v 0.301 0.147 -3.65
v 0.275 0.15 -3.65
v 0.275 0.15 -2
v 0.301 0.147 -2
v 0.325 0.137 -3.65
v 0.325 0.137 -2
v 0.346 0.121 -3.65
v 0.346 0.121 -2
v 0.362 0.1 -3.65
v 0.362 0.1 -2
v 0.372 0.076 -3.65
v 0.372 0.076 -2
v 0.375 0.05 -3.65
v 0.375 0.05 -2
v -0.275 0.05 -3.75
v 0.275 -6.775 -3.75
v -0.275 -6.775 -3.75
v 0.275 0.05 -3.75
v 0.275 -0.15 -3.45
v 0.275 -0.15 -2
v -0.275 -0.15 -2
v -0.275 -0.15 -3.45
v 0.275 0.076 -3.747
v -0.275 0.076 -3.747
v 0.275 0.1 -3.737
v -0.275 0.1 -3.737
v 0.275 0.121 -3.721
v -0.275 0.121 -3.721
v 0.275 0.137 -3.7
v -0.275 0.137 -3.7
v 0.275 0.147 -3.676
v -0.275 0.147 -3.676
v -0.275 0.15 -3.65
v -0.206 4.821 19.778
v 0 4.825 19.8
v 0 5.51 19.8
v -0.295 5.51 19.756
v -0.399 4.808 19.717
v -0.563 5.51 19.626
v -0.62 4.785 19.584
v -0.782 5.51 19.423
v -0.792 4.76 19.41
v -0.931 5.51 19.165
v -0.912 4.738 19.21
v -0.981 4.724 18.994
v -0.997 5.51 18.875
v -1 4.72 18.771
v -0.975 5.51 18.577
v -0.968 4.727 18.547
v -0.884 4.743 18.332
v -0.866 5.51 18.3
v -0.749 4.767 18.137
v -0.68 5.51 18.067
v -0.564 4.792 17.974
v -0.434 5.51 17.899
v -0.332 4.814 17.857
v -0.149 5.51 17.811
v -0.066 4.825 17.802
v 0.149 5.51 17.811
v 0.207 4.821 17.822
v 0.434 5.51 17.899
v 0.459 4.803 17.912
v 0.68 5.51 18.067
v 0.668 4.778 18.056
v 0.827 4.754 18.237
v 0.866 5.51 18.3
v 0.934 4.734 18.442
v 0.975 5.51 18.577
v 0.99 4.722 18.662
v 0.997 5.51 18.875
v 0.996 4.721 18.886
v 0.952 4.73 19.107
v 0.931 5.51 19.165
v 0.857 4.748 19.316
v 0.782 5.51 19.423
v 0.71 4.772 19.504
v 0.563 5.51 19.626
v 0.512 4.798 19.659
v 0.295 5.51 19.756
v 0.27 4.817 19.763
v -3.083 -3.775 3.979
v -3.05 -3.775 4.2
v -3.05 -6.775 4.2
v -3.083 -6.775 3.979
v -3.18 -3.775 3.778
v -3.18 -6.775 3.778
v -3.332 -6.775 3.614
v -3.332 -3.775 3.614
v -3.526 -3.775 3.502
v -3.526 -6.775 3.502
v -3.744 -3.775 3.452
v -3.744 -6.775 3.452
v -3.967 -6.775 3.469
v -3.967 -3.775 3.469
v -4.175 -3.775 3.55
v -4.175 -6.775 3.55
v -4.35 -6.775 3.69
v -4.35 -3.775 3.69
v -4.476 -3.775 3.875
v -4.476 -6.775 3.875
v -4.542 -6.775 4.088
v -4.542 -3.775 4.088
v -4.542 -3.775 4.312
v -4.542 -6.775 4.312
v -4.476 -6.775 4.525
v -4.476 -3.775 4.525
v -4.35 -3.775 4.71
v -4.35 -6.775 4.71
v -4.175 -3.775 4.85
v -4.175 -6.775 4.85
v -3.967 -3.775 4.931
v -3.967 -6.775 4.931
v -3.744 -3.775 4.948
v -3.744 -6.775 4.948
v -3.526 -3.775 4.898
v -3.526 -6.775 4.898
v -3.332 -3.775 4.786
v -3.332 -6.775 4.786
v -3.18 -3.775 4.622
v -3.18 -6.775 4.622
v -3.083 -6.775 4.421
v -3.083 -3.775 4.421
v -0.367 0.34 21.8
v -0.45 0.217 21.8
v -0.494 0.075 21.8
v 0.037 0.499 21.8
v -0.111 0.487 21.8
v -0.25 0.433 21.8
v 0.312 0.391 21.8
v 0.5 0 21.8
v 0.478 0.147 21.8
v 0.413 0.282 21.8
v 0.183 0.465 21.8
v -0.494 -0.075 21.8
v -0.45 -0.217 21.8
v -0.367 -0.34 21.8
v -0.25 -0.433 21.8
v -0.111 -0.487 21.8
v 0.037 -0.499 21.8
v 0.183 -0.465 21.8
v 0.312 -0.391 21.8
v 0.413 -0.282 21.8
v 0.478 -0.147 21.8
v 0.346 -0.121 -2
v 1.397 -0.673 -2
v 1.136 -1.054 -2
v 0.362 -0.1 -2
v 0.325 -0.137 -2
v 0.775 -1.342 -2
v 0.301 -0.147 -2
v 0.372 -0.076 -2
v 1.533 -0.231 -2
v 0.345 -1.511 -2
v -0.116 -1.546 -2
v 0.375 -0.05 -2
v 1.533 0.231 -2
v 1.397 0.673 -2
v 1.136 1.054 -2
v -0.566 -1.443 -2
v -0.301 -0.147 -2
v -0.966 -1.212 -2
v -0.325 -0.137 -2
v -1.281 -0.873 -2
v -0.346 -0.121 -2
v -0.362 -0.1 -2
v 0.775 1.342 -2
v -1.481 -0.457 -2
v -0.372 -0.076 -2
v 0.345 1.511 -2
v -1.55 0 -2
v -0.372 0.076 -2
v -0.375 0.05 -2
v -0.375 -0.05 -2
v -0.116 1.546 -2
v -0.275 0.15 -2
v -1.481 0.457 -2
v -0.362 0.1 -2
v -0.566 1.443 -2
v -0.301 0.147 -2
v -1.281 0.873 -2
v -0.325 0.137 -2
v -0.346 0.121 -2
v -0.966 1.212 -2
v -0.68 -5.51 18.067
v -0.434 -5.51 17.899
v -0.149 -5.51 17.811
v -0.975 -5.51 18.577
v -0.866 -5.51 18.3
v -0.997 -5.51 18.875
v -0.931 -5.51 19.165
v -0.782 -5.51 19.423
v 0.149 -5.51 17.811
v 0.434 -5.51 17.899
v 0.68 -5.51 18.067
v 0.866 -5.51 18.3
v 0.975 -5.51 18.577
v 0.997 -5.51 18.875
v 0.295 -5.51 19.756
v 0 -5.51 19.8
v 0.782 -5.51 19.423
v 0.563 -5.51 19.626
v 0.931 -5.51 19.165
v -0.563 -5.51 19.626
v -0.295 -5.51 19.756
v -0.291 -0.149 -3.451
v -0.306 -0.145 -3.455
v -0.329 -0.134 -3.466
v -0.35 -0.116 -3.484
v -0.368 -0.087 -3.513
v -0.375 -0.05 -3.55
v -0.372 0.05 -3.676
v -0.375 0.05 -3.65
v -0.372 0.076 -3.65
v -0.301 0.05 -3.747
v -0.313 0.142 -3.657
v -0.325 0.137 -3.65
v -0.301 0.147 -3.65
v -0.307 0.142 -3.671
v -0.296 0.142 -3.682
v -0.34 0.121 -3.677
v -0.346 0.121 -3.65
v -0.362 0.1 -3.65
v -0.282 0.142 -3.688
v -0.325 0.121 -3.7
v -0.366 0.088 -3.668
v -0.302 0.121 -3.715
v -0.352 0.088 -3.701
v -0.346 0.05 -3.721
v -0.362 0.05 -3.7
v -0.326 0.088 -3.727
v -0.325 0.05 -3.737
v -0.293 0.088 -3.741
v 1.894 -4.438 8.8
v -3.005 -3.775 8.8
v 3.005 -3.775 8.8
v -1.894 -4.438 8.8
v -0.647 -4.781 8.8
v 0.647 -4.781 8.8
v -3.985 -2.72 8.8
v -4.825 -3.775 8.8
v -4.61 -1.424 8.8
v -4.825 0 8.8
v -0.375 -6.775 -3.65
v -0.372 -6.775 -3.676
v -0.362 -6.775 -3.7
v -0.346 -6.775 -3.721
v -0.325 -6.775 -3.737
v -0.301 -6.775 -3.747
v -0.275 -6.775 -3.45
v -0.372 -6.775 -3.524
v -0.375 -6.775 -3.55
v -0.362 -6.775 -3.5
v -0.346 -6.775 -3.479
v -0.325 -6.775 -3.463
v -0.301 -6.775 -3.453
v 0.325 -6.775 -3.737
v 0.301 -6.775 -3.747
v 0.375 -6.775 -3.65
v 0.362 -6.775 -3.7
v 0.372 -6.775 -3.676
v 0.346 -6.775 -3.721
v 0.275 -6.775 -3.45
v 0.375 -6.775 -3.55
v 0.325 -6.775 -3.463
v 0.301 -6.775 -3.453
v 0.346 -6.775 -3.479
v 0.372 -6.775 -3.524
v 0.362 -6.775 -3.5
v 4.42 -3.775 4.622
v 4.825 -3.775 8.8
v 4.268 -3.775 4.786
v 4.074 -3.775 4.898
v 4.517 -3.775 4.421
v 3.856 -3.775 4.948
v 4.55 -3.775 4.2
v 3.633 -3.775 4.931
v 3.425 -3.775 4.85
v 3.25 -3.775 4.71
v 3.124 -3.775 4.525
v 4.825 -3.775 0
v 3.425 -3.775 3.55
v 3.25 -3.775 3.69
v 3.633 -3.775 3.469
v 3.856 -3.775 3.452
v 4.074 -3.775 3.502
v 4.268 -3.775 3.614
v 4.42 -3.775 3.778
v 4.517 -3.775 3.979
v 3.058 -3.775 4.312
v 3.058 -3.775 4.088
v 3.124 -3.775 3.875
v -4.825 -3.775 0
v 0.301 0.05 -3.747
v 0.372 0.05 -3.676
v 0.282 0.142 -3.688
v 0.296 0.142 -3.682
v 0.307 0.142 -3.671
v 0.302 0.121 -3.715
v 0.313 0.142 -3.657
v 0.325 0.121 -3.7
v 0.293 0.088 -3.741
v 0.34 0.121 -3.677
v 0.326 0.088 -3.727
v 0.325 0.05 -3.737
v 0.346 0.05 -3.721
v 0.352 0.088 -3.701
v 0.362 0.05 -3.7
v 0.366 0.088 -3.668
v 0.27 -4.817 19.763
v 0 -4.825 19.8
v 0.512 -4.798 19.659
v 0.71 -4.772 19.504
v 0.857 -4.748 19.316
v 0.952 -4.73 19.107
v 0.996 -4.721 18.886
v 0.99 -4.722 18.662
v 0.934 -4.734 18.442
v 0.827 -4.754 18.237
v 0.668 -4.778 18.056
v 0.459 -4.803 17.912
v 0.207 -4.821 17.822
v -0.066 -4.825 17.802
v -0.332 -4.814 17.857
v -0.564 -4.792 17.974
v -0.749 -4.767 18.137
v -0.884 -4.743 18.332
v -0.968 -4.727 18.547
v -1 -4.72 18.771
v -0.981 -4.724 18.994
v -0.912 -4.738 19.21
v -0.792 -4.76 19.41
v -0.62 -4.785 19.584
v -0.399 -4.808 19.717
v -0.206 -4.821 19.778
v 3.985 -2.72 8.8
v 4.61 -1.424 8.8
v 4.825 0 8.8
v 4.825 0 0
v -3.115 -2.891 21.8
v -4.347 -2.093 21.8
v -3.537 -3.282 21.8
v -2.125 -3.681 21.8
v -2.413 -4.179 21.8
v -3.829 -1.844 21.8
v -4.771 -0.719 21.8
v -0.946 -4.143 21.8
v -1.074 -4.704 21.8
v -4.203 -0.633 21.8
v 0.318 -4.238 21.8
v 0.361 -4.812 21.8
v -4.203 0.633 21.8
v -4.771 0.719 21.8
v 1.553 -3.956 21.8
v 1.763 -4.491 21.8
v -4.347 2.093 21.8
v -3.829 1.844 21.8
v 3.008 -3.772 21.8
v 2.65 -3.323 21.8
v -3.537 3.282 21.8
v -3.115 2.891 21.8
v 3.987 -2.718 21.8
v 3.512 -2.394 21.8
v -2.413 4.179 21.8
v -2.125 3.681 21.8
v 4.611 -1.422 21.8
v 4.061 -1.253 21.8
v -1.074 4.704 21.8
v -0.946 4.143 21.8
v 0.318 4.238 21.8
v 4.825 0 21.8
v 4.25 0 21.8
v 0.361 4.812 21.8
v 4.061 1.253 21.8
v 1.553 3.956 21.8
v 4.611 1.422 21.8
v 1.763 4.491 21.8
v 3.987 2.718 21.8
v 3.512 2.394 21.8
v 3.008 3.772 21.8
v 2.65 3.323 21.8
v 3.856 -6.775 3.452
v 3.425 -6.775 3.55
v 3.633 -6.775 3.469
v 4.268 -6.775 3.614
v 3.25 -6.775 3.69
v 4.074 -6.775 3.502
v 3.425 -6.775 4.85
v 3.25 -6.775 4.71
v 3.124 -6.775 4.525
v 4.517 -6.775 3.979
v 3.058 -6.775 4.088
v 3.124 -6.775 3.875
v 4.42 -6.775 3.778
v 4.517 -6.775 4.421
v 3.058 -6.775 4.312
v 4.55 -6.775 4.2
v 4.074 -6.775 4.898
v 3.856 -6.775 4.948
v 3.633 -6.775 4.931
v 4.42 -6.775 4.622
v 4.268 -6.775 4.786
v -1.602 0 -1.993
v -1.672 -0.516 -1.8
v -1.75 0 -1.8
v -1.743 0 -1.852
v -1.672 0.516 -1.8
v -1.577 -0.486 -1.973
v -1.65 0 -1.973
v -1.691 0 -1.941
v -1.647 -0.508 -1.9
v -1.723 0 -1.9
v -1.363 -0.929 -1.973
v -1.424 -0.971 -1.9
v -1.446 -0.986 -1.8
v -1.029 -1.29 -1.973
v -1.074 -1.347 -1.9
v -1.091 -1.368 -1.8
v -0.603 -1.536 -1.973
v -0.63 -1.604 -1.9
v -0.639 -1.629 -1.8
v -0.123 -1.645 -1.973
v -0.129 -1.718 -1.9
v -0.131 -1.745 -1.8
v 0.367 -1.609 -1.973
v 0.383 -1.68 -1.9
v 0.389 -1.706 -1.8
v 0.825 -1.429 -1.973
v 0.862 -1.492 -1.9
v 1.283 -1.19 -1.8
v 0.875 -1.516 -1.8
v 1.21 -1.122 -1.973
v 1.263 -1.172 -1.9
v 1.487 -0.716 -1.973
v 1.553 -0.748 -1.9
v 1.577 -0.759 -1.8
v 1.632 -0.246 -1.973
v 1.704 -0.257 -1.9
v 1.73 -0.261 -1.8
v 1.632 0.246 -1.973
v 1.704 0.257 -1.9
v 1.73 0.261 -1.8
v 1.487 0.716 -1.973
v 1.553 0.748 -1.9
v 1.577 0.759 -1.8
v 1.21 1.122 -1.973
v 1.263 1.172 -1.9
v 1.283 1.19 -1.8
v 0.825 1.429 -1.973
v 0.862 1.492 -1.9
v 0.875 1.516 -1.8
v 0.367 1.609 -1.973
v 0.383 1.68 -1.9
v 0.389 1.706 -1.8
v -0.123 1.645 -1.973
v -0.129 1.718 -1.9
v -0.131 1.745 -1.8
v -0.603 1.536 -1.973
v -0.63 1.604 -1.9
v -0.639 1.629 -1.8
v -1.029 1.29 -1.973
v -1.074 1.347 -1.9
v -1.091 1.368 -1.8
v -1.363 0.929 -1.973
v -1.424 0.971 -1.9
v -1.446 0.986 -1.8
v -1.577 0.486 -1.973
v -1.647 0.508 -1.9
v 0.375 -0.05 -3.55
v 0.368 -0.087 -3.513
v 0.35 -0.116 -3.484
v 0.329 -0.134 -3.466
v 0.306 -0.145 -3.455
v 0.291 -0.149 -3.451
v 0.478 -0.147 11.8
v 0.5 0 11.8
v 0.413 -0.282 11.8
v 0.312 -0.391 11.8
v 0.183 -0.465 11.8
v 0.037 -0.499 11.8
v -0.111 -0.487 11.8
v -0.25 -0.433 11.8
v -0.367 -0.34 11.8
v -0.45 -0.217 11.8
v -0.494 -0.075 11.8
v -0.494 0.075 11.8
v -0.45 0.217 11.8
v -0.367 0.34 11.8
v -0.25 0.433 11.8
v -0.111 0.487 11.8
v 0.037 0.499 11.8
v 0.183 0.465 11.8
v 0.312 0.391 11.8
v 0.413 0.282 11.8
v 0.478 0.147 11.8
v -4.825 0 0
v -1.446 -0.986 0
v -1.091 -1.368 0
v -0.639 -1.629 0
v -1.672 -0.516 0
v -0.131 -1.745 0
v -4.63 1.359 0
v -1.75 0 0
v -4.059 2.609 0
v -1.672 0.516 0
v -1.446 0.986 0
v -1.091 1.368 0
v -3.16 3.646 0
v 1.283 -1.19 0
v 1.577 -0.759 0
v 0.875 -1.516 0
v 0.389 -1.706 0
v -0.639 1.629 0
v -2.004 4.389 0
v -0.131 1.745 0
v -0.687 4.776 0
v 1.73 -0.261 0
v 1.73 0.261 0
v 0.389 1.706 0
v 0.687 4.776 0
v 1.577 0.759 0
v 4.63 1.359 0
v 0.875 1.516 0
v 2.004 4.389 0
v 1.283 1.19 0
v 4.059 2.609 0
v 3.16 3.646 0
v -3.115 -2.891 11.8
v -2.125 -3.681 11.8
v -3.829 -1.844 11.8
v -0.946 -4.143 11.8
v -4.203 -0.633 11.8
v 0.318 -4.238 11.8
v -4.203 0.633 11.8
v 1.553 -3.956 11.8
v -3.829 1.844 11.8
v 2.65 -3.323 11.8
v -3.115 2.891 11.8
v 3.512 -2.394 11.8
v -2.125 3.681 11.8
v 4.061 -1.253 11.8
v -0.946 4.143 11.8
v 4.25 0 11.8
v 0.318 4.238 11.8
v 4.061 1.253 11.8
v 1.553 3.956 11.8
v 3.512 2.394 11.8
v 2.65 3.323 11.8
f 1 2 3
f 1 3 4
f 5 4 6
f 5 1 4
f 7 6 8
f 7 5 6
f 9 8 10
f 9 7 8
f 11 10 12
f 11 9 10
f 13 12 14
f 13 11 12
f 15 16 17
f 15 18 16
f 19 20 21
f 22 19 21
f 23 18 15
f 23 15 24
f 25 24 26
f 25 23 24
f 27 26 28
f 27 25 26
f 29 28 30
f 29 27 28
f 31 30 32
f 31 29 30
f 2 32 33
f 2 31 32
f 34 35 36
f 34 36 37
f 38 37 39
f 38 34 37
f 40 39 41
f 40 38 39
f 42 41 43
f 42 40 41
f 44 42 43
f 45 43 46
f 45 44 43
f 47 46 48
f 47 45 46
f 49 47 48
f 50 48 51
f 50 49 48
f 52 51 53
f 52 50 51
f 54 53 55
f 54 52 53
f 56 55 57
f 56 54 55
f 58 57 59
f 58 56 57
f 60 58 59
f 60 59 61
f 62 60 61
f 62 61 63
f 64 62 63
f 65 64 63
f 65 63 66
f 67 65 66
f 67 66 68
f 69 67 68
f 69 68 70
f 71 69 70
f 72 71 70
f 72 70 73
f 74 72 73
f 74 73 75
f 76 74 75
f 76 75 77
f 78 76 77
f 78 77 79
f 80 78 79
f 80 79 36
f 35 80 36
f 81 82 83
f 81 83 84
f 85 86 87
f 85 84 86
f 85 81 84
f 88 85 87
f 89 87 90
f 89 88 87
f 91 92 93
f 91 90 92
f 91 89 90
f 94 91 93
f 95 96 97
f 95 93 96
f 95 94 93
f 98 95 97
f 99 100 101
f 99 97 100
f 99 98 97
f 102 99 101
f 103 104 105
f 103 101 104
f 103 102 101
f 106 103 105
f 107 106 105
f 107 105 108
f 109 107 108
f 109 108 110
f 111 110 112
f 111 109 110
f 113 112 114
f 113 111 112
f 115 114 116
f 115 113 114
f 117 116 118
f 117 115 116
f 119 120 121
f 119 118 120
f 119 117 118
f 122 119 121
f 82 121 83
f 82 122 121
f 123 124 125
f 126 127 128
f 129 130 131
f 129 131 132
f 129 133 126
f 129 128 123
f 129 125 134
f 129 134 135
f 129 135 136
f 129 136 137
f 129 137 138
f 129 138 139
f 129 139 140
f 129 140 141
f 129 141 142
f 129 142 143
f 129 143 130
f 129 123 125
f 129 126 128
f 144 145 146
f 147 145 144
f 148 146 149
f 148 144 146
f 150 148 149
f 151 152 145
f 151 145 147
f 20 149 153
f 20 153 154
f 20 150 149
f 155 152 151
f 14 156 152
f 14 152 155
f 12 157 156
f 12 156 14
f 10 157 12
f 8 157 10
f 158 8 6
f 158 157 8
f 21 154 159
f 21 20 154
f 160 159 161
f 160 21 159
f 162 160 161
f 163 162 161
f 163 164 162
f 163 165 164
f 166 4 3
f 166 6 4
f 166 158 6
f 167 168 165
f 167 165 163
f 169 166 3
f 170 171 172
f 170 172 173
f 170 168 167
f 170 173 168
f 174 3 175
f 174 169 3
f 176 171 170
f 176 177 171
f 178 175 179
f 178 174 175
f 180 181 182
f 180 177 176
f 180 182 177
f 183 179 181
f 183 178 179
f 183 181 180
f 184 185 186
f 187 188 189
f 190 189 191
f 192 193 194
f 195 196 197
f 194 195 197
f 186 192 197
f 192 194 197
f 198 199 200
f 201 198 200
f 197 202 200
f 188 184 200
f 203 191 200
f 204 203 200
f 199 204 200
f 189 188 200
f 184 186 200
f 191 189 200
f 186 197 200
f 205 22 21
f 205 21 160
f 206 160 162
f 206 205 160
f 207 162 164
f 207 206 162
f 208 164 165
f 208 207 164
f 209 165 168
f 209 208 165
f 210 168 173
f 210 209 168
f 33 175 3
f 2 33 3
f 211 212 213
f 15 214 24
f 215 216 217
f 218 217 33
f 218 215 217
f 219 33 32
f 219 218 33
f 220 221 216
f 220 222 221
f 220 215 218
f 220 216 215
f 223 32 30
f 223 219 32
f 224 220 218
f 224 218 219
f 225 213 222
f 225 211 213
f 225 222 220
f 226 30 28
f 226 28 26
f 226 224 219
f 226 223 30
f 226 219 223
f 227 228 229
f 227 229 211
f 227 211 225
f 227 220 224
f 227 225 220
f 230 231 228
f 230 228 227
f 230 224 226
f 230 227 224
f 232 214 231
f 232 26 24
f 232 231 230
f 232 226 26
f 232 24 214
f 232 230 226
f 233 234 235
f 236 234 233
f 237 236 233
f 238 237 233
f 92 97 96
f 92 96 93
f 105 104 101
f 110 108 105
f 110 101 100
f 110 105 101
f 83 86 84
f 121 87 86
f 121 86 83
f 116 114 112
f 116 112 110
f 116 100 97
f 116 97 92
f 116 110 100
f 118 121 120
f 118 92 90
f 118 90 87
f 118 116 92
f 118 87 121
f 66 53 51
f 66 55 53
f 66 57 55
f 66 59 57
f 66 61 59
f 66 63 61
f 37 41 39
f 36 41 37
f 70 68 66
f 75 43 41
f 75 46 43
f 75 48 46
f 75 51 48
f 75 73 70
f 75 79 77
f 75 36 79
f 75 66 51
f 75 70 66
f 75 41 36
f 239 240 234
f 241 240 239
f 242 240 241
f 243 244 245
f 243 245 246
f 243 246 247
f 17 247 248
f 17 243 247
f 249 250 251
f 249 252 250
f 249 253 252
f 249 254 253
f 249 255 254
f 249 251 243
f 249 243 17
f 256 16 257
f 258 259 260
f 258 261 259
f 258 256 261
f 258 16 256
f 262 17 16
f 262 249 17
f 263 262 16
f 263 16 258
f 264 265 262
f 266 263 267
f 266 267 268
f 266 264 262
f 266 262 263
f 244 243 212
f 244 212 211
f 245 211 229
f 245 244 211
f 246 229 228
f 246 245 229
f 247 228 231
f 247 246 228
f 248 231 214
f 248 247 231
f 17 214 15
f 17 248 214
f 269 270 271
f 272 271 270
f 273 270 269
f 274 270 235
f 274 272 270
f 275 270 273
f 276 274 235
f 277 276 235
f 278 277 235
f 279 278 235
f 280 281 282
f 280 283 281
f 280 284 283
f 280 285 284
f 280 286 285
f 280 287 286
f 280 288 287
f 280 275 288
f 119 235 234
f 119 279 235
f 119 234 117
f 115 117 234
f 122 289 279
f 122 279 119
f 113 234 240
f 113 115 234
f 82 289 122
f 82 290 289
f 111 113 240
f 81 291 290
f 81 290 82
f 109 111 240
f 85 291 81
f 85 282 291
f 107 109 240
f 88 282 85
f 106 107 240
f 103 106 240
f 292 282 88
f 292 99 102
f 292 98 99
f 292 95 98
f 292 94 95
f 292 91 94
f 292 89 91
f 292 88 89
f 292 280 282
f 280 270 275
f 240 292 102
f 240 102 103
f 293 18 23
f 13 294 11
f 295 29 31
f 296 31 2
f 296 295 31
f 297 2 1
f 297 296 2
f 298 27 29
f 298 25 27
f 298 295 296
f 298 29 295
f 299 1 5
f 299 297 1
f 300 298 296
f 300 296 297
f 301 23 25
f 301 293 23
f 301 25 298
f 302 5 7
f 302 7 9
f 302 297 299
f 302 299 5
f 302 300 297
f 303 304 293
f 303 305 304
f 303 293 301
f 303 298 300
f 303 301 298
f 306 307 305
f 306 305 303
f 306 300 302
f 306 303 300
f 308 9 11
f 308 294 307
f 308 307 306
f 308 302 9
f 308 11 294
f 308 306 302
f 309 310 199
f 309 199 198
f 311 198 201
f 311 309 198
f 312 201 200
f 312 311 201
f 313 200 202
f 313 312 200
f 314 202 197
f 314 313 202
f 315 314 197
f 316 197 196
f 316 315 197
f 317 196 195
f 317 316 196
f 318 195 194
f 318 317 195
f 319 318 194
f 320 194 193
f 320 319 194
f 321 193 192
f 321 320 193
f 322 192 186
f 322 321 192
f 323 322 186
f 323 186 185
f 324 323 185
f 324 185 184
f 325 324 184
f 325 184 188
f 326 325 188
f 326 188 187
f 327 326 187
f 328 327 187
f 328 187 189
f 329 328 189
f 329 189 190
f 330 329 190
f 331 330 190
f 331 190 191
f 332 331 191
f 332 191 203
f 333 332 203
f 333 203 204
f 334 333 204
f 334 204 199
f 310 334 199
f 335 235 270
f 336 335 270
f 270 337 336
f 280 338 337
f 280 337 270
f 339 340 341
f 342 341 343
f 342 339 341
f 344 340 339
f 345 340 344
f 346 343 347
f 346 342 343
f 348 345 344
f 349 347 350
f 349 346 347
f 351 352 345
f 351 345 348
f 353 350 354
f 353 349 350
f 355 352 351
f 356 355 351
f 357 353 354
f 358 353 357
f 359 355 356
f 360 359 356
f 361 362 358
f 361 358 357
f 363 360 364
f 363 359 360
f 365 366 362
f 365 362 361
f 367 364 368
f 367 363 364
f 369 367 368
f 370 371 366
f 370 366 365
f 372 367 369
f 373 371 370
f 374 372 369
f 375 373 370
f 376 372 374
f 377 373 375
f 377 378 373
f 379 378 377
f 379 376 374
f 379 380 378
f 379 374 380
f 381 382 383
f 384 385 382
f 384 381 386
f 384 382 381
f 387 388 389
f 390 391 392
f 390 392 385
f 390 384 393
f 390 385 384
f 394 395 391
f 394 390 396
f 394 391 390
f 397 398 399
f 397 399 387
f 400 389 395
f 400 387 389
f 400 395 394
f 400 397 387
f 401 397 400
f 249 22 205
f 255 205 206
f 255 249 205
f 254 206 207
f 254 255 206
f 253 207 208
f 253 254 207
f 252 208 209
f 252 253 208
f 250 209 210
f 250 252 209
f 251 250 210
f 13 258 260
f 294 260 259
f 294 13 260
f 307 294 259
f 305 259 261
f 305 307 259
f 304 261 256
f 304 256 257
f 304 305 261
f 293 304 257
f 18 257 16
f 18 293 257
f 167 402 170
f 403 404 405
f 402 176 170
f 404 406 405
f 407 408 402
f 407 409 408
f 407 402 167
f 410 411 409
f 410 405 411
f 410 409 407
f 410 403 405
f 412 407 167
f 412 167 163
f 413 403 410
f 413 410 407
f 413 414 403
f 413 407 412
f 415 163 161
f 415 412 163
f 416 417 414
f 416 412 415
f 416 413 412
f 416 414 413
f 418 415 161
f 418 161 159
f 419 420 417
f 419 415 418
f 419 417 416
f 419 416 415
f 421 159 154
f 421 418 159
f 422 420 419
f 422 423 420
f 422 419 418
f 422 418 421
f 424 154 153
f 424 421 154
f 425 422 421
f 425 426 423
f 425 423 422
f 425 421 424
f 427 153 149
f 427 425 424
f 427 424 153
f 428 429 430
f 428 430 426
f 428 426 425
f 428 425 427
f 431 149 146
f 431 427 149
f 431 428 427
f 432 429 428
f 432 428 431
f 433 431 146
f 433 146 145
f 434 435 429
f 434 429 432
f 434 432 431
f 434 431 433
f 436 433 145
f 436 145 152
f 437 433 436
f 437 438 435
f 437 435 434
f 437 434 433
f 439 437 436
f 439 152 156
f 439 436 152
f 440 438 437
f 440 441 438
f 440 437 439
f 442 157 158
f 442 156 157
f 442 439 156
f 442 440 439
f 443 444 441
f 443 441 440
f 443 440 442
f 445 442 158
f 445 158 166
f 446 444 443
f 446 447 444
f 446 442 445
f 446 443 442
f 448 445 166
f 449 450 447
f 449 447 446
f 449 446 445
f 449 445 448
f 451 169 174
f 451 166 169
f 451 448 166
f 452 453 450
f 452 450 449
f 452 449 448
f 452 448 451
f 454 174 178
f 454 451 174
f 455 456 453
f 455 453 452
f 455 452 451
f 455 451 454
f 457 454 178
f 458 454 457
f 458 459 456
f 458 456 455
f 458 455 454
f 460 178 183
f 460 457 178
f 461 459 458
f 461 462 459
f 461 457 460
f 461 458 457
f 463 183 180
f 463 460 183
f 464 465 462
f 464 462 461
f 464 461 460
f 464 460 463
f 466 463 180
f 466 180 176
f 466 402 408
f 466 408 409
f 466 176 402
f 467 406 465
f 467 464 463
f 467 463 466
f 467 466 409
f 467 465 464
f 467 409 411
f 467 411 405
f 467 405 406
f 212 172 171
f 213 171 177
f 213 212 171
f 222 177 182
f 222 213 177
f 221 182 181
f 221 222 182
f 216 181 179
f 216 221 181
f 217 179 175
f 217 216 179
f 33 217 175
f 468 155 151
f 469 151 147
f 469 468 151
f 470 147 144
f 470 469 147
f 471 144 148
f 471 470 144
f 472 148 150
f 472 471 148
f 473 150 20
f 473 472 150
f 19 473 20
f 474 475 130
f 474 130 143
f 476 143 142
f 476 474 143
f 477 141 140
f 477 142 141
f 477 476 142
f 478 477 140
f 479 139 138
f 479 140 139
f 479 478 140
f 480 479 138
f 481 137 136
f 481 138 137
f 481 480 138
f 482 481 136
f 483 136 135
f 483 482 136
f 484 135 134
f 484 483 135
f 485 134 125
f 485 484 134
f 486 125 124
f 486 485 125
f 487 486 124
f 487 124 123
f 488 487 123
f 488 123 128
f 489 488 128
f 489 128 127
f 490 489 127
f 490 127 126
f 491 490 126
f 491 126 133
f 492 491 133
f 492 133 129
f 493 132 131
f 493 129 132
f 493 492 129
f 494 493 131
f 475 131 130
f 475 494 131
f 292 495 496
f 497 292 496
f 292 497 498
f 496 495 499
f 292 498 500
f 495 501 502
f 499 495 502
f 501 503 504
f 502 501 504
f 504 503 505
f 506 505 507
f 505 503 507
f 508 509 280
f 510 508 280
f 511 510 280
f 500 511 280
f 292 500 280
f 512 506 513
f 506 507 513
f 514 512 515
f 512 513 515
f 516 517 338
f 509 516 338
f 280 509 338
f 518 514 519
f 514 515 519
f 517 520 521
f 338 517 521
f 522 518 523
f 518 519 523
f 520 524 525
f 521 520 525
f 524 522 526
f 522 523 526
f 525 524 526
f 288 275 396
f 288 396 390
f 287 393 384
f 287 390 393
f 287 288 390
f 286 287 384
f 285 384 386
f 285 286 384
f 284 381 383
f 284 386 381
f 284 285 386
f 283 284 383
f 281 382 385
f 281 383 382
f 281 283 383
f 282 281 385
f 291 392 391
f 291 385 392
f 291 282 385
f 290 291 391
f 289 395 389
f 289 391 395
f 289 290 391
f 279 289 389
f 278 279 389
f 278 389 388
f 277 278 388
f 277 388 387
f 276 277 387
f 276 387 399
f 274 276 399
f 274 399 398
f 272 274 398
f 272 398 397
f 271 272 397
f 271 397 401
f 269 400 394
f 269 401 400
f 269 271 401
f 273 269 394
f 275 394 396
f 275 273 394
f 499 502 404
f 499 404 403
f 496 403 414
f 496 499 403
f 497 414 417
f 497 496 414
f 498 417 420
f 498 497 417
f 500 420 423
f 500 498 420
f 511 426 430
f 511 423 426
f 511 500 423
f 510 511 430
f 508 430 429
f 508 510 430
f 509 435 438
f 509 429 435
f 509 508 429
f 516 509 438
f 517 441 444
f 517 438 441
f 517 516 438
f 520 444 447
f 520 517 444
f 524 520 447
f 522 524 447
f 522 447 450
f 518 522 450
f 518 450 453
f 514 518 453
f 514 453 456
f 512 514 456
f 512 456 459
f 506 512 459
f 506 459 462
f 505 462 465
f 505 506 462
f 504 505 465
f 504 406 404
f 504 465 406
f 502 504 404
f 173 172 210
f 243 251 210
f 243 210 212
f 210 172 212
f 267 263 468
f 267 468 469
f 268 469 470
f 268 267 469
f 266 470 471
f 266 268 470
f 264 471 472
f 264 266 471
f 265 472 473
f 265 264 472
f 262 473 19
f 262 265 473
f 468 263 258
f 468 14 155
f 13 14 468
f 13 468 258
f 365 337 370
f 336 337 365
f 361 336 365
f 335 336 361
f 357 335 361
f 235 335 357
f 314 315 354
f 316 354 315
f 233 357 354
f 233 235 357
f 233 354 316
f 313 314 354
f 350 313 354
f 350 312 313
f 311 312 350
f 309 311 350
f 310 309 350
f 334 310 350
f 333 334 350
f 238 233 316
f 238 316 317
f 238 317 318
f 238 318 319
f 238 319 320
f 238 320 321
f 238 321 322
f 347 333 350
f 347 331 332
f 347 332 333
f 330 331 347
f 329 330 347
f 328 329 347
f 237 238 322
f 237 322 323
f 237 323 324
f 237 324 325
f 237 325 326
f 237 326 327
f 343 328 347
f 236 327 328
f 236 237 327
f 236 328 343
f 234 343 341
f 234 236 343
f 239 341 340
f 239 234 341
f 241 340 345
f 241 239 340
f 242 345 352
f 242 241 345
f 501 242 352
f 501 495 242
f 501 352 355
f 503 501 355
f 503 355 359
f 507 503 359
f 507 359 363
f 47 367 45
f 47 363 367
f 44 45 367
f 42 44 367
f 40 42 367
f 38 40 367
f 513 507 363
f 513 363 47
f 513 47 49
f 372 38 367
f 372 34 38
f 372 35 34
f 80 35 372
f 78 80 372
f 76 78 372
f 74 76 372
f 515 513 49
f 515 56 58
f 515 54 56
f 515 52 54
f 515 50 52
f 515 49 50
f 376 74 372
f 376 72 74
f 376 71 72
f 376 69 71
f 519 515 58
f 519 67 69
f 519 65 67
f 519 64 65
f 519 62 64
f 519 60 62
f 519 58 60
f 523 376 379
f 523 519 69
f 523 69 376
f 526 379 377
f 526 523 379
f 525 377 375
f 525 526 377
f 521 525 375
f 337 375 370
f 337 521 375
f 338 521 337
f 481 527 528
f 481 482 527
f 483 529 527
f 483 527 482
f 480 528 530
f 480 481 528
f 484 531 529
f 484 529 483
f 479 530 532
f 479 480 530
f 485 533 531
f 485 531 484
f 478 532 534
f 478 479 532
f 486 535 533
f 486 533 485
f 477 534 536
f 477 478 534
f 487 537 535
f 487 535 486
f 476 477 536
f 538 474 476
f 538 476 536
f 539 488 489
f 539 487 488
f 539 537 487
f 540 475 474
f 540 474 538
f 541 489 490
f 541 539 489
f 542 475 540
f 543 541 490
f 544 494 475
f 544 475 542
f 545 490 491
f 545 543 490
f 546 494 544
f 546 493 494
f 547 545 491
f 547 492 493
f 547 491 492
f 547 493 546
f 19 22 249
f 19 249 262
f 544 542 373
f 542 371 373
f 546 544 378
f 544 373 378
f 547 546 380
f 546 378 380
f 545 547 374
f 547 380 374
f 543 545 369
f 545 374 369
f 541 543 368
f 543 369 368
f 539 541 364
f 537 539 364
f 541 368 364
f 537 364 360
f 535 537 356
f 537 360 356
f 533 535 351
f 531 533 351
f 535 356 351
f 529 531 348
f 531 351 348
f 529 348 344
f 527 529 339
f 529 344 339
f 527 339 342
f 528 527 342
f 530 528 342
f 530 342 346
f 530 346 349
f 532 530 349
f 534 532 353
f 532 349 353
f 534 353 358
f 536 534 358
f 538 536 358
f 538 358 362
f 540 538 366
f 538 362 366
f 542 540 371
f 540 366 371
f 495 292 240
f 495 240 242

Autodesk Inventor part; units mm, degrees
ref_plane "YZ Plane" through (0, 0, 0) normal (1, 0, 0) x (0, 1, 0)
sketch "Sketch1" plane through (0, 0, 0) normal (0, 0, 1) x (1, 0, 0)
  arc A0 (4.825, 0) -> (-4.825, 0) centre (0, 0) ccw
  line L0 (4.825, 0) -> (4.825, -3.775)
  line L1 (4.825, -3.775) -> (-4.825, -3.775)
  line L2 (-4.825, -3.775) -> (-4.825, 0)
  dimension "d0" = 9.65
  dimension "d2" = 3.775
  dimension "d3" = 9.65
extrude "Extrusion1" add sketch "Sketch1" along normal blind 8.8
sketch "Sketch2" plane through (0, 0, 8.8) normal (0, 0, 1) x (1, 0, 0)
  arc A0 (4.825, 0) -> (-4.825, 0) centre (0, 0) ccw projected
  circle A1 centre (0, 0) radius 4.825
extrude "Extrusion2" add sketch "Sketch2" along normal blind 13
ref_plane "Work Plane2" through (0, 0, 11.8) normal (0, 0, 1) x (1, 0, 0)
sketch "Sketch5" plane through (-4.825, -3.775, 0) normal (0, -1, 0) x (1, 0, 0)
  line L0 (1.82, 8.8) -> (7.83, 8.8) projected
  line L1 (0, 0) -> (0, 8.8) projected
  circle A0 centre (1.025, 4.2) radius 0.75
  circle A1 centre (8.625, 4.2) radius 0.75
  point P0 (4.825, 0)
  dimension "d15" = 1.5
  dimension "d17" = 1.5
  dimension "d18" = 4.6
  dimension "d19" = 4.6
  dimension "d20" = 7.6
  dimension "d21" = 1.025
extrude "Extrusion5" add sketch "Sketch5" along normal blind 3
sketch "Sketch6" plane through (0, 0, 0) normal (0, 0, -1) x (-1, 0, 0)
  arc A0 (4.825, 0) -> (-4.825, 0) centre (0, 0) ccw projected
  circle A1 centre (0, 0) radius 1.75
  dimension "d24" = 3.5
extrude "Extrusion6" add sketch "Sketch6" along normal blind 2
sketch "Sketch7" plane through (0, 0, -2) normal (0, 0, -1) x (-1, 0, 0)
  circle A0 centre (0, 0) radius 1.75 projected
  line L0 (-0.375, 0.15) -> (-0.375, -0.15)
  line L1 (-0.375, -0.15) -> (0.375, -0.15)
  line L2 (0.375, -0.15) -> (0.375, 0.15)
  line L3 (0.375, 0.15) -> (-0.375, 0.15)
  dimension "d28" = 0.3
  dimension "d30" = 0.75
  dimension "d31" = 0.375
  dimension "d32" = 0.15
extrude "Extrusion7" add sketch "Sketch7" along normal blind 1.75 contours L3 L2 L1 L0
sketch "Sketch8" plane through (-0.375, -0.15, -2) normal (0, -1, 0) x (1, 0, 0)
  line L0 (0, 0) -> (0, -1.75) projected
  line L1 (0.75, -1.75) -> (0, -1.75) projected
  line L2 (0.75, 0) -> (0.75, -1.75) projected
  line L3 (0, -1.75) -> (0, -1.45)
  line L4 (0, -1.45) -> (0.75, -1.45)
  line L5 (0.75, -1.45) -> (0.75, -1.75)
  line L6 (0, -1.75) -> (0.75, -1.75)
  point P0 (0.375, 2)
  dimension "d35" = 0.3
  dimension "d36" = 0.75
extrude "Extrusion8" add sketch "Sketch8" along normal blind 6.625
fillet "Fillet1" radius 0.2 1 edges at (1.75, 0, -2)
fillet "Fillet2" radius 0.1 9 edges at (-0.375, -3.3125, -3.75) (0.375, -3.3125, -3.75) (-0.375, -3.4625, -3.45) (0, 0.15, -3.75) (-0.375, 0.15, -2.875) (-0.375, -0.15, -2.725) (0.375, 0.15, -2.875) (0.375, -0.15, -2.725) (0.375, -3.4625, -3.45)
ref_plane "Work Plane1" through (0, 0, 21.8) normal (0, 1, 0) x (0, 0, 1)
sketch "Sketch9" plane through (0, 0, 21.8) normal (0, 1, 0) x (0, 0, 1)
  circle A0 centre (-3, 0) radius 1
  line L0 (0, -4.825) -> (0, 4.825) projected
  line L1 (0, 0) -> (-8.1755, 0)
  point P0 (-21.8, 0)
  dimension "d42" = 2
  dimension "d44" = 3
  dimension "d45" = 0
extrude "Extrusion9" add sketch "Sketch9" along normal mid plane 11.02
sketch "Sketch3" plane through (0, 0, 21.8) normal (0, 0, 1) x (1, 0, 0)
  circle A0 centre (0, 0) radius 4.825 projected
  circle A1 centre (0, 0) radius 4.25
  dimension "d8" = 8.5
extrude "Extrusion10" cut sketch "Sketch3" against normal blind 10 contours A1
sketch "Sketch4" plane through (0, 0, 11.8) normal (0, 0, 1) x (1, 0, 0)
  circle A0 centre (0, 0) radius 4.25 projected
  circle A1 centre (0, 0) radius 0.5
  dimension "d12" = 1
extrude "Extrusion4" add sketch "Sketch4" along normal blind 10 contours A1
properties part number "0731000105"
